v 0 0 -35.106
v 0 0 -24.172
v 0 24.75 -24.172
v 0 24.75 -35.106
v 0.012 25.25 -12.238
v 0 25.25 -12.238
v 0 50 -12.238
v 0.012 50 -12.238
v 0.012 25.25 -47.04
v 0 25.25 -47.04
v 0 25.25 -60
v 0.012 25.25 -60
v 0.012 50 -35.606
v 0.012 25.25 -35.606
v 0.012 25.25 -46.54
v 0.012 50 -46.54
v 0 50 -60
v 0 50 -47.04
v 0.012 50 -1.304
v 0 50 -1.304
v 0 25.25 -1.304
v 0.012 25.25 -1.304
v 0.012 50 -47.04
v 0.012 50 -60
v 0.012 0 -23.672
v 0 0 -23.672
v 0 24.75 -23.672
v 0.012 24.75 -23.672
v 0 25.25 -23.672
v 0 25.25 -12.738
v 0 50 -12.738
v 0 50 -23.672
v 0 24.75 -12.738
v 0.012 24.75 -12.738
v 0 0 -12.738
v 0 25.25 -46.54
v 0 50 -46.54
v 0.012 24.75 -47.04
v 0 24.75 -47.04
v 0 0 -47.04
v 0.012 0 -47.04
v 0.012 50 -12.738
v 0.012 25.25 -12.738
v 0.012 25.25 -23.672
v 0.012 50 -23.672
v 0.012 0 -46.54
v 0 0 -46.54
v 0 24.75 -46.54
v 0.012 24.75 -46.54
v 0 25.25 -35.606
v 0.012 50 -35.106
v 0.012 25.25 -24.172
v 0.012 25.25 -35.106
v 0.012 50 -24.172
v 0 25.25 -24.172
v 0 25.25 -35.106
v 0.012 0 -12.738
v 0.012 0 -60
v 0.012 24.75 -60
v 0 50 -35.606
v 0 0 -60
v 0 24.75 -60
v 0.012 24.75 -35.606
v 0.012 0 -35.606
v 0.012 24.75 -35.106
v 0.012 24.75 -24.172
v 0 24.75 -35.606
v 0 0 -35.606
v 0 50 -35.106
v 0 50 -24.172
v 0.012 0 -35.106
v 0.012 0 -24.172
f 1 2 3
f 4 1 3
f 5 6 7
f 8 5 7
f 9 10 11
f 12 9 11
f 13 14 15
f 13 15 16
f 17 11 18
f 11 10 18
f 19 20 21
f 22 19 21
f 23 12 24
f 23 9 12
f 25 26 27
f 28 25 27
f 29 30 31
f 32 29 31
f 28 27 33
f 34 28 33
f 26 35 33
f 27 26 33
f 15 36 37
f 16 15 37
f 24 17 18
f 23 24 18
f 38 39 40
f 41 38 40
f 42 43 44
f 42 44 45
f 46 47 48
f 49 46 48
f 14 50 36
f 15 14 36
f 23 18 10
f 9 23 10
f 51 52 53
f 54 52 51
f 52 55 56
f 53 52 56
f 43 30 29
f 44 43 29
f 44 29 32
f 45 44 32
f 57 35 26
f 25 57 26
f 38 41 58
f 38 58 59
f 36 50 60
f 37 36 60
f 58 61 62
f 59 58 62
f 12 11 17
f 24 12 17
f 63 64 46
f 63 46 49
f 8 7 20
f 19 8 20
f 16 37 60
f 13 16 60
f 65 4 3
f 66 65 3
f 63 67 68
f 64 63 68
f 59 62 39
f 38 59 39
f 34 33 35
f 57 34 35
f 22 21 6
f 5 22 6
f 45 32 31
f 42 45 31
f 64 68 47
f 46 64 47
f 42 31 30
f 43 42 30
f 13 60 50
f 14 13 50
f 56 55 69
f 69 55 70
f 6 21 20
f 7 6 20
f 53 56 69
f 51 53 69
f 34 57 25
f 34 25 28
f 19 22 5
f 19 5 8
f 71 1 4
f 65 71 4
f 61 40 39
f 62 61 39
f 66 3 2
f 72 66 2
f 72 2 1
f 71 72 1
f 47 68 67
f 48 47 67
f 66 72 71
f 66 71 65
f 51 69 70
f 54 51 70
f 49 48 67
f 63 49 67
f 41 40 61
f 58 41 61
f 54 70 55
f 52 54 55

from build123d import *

# Parameters (mm, degrees)
F1_DEPTH = 0.012


# Not quite as in the source:
# - a feature names something its author has since deleted; it is built from what else it names


with BuildPart() as f1:
    # F0 (on Right) → F1 (new body)
    with BuildSketch(Plane.YZ):
        Polygon((50, -12.238), (50, -1.304), (25.25, -1.304), (25.25, -3.119), (25.25, -6.119), (25.25, -6.521), (25.25, -7.021), (25.25, -9.119), (25.25, -12.238), align=None)
    extrude(amount=F1_DEPTH)


with BuildPart() as f1b:
    # F0 (on Right) → F1, piece 2 (new body)
    with BuildSketch(Plane.YZ):
        Polygon((12.375, -12.738), (7.3750000447, -12.738), (0, -12.738), (0, -23.672), (24.75, -23.672), (24.75, -21.205), (24.75, -18.205), (24.75, -15.205), (24.75, -12.738), (17.375, -12.738), align=None)
    extrude(amount=F1_DEPTH)


with BuildPart() as f1c:
    # F0 (on Right) → F1, piece 3 (new body)
    with BuildSketch(Plane.YZ):
        Polygon((25.25, -12.738), (25.25, -15.205), (25.25, -17.955), (25.25, -18.205), (25.25, -18.455), (25.25, -21.205), (25.25, -23.672), (50, -23.672), (50, -12.738), align=None)
    extrude(amount=F1_DEPTH)


with BuildPart() as f1d:
    # F0 (on Right) → F1, piece 4 (new body)
    with BuildSketch(Plane.YZ):
        Polygon((50, -24.172), (25.25, -24.172), (25.25, -29.389), (25.25, -29.889), (25.25, -35.106), (50, -35.106), align=None)
    extrude(amount=F1_DEPTH)


with BuildPart() as f1e:
    # F0 (on Right) → F1, piece 5 (new body)
    with BuildSketch(Plane.YZ):
        Polygon((24.75, -24.172), (0, -24.172), (0, -35.106), (24.75, -35.106), (24.75, -29.889), (24.75, -29.389), align=None)
    extrude(amount=F1_DEPTH)


with BuildPart() as f1f:
    # F0 (on Right) → F1, piece 6 (new body)
    with BuildSketch(Plane.YZ):
        Polygon((24.75, -35.606), (0, -35.606), (0, -46.54), (24.75, -46.54), (24.75, -41.323), (24.75, -40.823), align=None)
    extrude(amount=F1_DEPTH)


with BuildPart() as f1g:
    # F0 (on Right) → F1, piece 7 (new body)
    with BuildSketch(Plane.YZ):
        Polygon((50, -35.606), (25.25, -35.606), (25.25, -40.823), (25.25, -41.323), (25.25, -46.54), (50, -46.54), align=None)
    extrude(amount=F1_DEPTH)


with BuildPart() as f1h:
    # F0 (on Right) → F1, piece 8 (new body)
    with BuildSketch(Plane.YZ):
        Polygon((25.25, -52.757), (25.25, -60), (50, -60), (50, -47.04), (25.25, -47.04), (25.25, -52.257), align=None)
    extrude(amount=F1_DEPTH)


with BuildPart() as f1i:
    # F0 (on Right) → F1, piece 9 (new body)
    with BuildSketch(Plane.YZ):
        Polygon((0, -47.04), (0, -60), (24.75, -60), (24.75, -52.757), (24.75, -52.257), (24.75, -47.04), align=None)
    extrude(amount=F1_DEPTH)


solid = Compound([f1.part, f1b.part, f1c.part, f1d.part, f1e.part, f1f.part, f1g.part, f1h.part, f1i.part])
